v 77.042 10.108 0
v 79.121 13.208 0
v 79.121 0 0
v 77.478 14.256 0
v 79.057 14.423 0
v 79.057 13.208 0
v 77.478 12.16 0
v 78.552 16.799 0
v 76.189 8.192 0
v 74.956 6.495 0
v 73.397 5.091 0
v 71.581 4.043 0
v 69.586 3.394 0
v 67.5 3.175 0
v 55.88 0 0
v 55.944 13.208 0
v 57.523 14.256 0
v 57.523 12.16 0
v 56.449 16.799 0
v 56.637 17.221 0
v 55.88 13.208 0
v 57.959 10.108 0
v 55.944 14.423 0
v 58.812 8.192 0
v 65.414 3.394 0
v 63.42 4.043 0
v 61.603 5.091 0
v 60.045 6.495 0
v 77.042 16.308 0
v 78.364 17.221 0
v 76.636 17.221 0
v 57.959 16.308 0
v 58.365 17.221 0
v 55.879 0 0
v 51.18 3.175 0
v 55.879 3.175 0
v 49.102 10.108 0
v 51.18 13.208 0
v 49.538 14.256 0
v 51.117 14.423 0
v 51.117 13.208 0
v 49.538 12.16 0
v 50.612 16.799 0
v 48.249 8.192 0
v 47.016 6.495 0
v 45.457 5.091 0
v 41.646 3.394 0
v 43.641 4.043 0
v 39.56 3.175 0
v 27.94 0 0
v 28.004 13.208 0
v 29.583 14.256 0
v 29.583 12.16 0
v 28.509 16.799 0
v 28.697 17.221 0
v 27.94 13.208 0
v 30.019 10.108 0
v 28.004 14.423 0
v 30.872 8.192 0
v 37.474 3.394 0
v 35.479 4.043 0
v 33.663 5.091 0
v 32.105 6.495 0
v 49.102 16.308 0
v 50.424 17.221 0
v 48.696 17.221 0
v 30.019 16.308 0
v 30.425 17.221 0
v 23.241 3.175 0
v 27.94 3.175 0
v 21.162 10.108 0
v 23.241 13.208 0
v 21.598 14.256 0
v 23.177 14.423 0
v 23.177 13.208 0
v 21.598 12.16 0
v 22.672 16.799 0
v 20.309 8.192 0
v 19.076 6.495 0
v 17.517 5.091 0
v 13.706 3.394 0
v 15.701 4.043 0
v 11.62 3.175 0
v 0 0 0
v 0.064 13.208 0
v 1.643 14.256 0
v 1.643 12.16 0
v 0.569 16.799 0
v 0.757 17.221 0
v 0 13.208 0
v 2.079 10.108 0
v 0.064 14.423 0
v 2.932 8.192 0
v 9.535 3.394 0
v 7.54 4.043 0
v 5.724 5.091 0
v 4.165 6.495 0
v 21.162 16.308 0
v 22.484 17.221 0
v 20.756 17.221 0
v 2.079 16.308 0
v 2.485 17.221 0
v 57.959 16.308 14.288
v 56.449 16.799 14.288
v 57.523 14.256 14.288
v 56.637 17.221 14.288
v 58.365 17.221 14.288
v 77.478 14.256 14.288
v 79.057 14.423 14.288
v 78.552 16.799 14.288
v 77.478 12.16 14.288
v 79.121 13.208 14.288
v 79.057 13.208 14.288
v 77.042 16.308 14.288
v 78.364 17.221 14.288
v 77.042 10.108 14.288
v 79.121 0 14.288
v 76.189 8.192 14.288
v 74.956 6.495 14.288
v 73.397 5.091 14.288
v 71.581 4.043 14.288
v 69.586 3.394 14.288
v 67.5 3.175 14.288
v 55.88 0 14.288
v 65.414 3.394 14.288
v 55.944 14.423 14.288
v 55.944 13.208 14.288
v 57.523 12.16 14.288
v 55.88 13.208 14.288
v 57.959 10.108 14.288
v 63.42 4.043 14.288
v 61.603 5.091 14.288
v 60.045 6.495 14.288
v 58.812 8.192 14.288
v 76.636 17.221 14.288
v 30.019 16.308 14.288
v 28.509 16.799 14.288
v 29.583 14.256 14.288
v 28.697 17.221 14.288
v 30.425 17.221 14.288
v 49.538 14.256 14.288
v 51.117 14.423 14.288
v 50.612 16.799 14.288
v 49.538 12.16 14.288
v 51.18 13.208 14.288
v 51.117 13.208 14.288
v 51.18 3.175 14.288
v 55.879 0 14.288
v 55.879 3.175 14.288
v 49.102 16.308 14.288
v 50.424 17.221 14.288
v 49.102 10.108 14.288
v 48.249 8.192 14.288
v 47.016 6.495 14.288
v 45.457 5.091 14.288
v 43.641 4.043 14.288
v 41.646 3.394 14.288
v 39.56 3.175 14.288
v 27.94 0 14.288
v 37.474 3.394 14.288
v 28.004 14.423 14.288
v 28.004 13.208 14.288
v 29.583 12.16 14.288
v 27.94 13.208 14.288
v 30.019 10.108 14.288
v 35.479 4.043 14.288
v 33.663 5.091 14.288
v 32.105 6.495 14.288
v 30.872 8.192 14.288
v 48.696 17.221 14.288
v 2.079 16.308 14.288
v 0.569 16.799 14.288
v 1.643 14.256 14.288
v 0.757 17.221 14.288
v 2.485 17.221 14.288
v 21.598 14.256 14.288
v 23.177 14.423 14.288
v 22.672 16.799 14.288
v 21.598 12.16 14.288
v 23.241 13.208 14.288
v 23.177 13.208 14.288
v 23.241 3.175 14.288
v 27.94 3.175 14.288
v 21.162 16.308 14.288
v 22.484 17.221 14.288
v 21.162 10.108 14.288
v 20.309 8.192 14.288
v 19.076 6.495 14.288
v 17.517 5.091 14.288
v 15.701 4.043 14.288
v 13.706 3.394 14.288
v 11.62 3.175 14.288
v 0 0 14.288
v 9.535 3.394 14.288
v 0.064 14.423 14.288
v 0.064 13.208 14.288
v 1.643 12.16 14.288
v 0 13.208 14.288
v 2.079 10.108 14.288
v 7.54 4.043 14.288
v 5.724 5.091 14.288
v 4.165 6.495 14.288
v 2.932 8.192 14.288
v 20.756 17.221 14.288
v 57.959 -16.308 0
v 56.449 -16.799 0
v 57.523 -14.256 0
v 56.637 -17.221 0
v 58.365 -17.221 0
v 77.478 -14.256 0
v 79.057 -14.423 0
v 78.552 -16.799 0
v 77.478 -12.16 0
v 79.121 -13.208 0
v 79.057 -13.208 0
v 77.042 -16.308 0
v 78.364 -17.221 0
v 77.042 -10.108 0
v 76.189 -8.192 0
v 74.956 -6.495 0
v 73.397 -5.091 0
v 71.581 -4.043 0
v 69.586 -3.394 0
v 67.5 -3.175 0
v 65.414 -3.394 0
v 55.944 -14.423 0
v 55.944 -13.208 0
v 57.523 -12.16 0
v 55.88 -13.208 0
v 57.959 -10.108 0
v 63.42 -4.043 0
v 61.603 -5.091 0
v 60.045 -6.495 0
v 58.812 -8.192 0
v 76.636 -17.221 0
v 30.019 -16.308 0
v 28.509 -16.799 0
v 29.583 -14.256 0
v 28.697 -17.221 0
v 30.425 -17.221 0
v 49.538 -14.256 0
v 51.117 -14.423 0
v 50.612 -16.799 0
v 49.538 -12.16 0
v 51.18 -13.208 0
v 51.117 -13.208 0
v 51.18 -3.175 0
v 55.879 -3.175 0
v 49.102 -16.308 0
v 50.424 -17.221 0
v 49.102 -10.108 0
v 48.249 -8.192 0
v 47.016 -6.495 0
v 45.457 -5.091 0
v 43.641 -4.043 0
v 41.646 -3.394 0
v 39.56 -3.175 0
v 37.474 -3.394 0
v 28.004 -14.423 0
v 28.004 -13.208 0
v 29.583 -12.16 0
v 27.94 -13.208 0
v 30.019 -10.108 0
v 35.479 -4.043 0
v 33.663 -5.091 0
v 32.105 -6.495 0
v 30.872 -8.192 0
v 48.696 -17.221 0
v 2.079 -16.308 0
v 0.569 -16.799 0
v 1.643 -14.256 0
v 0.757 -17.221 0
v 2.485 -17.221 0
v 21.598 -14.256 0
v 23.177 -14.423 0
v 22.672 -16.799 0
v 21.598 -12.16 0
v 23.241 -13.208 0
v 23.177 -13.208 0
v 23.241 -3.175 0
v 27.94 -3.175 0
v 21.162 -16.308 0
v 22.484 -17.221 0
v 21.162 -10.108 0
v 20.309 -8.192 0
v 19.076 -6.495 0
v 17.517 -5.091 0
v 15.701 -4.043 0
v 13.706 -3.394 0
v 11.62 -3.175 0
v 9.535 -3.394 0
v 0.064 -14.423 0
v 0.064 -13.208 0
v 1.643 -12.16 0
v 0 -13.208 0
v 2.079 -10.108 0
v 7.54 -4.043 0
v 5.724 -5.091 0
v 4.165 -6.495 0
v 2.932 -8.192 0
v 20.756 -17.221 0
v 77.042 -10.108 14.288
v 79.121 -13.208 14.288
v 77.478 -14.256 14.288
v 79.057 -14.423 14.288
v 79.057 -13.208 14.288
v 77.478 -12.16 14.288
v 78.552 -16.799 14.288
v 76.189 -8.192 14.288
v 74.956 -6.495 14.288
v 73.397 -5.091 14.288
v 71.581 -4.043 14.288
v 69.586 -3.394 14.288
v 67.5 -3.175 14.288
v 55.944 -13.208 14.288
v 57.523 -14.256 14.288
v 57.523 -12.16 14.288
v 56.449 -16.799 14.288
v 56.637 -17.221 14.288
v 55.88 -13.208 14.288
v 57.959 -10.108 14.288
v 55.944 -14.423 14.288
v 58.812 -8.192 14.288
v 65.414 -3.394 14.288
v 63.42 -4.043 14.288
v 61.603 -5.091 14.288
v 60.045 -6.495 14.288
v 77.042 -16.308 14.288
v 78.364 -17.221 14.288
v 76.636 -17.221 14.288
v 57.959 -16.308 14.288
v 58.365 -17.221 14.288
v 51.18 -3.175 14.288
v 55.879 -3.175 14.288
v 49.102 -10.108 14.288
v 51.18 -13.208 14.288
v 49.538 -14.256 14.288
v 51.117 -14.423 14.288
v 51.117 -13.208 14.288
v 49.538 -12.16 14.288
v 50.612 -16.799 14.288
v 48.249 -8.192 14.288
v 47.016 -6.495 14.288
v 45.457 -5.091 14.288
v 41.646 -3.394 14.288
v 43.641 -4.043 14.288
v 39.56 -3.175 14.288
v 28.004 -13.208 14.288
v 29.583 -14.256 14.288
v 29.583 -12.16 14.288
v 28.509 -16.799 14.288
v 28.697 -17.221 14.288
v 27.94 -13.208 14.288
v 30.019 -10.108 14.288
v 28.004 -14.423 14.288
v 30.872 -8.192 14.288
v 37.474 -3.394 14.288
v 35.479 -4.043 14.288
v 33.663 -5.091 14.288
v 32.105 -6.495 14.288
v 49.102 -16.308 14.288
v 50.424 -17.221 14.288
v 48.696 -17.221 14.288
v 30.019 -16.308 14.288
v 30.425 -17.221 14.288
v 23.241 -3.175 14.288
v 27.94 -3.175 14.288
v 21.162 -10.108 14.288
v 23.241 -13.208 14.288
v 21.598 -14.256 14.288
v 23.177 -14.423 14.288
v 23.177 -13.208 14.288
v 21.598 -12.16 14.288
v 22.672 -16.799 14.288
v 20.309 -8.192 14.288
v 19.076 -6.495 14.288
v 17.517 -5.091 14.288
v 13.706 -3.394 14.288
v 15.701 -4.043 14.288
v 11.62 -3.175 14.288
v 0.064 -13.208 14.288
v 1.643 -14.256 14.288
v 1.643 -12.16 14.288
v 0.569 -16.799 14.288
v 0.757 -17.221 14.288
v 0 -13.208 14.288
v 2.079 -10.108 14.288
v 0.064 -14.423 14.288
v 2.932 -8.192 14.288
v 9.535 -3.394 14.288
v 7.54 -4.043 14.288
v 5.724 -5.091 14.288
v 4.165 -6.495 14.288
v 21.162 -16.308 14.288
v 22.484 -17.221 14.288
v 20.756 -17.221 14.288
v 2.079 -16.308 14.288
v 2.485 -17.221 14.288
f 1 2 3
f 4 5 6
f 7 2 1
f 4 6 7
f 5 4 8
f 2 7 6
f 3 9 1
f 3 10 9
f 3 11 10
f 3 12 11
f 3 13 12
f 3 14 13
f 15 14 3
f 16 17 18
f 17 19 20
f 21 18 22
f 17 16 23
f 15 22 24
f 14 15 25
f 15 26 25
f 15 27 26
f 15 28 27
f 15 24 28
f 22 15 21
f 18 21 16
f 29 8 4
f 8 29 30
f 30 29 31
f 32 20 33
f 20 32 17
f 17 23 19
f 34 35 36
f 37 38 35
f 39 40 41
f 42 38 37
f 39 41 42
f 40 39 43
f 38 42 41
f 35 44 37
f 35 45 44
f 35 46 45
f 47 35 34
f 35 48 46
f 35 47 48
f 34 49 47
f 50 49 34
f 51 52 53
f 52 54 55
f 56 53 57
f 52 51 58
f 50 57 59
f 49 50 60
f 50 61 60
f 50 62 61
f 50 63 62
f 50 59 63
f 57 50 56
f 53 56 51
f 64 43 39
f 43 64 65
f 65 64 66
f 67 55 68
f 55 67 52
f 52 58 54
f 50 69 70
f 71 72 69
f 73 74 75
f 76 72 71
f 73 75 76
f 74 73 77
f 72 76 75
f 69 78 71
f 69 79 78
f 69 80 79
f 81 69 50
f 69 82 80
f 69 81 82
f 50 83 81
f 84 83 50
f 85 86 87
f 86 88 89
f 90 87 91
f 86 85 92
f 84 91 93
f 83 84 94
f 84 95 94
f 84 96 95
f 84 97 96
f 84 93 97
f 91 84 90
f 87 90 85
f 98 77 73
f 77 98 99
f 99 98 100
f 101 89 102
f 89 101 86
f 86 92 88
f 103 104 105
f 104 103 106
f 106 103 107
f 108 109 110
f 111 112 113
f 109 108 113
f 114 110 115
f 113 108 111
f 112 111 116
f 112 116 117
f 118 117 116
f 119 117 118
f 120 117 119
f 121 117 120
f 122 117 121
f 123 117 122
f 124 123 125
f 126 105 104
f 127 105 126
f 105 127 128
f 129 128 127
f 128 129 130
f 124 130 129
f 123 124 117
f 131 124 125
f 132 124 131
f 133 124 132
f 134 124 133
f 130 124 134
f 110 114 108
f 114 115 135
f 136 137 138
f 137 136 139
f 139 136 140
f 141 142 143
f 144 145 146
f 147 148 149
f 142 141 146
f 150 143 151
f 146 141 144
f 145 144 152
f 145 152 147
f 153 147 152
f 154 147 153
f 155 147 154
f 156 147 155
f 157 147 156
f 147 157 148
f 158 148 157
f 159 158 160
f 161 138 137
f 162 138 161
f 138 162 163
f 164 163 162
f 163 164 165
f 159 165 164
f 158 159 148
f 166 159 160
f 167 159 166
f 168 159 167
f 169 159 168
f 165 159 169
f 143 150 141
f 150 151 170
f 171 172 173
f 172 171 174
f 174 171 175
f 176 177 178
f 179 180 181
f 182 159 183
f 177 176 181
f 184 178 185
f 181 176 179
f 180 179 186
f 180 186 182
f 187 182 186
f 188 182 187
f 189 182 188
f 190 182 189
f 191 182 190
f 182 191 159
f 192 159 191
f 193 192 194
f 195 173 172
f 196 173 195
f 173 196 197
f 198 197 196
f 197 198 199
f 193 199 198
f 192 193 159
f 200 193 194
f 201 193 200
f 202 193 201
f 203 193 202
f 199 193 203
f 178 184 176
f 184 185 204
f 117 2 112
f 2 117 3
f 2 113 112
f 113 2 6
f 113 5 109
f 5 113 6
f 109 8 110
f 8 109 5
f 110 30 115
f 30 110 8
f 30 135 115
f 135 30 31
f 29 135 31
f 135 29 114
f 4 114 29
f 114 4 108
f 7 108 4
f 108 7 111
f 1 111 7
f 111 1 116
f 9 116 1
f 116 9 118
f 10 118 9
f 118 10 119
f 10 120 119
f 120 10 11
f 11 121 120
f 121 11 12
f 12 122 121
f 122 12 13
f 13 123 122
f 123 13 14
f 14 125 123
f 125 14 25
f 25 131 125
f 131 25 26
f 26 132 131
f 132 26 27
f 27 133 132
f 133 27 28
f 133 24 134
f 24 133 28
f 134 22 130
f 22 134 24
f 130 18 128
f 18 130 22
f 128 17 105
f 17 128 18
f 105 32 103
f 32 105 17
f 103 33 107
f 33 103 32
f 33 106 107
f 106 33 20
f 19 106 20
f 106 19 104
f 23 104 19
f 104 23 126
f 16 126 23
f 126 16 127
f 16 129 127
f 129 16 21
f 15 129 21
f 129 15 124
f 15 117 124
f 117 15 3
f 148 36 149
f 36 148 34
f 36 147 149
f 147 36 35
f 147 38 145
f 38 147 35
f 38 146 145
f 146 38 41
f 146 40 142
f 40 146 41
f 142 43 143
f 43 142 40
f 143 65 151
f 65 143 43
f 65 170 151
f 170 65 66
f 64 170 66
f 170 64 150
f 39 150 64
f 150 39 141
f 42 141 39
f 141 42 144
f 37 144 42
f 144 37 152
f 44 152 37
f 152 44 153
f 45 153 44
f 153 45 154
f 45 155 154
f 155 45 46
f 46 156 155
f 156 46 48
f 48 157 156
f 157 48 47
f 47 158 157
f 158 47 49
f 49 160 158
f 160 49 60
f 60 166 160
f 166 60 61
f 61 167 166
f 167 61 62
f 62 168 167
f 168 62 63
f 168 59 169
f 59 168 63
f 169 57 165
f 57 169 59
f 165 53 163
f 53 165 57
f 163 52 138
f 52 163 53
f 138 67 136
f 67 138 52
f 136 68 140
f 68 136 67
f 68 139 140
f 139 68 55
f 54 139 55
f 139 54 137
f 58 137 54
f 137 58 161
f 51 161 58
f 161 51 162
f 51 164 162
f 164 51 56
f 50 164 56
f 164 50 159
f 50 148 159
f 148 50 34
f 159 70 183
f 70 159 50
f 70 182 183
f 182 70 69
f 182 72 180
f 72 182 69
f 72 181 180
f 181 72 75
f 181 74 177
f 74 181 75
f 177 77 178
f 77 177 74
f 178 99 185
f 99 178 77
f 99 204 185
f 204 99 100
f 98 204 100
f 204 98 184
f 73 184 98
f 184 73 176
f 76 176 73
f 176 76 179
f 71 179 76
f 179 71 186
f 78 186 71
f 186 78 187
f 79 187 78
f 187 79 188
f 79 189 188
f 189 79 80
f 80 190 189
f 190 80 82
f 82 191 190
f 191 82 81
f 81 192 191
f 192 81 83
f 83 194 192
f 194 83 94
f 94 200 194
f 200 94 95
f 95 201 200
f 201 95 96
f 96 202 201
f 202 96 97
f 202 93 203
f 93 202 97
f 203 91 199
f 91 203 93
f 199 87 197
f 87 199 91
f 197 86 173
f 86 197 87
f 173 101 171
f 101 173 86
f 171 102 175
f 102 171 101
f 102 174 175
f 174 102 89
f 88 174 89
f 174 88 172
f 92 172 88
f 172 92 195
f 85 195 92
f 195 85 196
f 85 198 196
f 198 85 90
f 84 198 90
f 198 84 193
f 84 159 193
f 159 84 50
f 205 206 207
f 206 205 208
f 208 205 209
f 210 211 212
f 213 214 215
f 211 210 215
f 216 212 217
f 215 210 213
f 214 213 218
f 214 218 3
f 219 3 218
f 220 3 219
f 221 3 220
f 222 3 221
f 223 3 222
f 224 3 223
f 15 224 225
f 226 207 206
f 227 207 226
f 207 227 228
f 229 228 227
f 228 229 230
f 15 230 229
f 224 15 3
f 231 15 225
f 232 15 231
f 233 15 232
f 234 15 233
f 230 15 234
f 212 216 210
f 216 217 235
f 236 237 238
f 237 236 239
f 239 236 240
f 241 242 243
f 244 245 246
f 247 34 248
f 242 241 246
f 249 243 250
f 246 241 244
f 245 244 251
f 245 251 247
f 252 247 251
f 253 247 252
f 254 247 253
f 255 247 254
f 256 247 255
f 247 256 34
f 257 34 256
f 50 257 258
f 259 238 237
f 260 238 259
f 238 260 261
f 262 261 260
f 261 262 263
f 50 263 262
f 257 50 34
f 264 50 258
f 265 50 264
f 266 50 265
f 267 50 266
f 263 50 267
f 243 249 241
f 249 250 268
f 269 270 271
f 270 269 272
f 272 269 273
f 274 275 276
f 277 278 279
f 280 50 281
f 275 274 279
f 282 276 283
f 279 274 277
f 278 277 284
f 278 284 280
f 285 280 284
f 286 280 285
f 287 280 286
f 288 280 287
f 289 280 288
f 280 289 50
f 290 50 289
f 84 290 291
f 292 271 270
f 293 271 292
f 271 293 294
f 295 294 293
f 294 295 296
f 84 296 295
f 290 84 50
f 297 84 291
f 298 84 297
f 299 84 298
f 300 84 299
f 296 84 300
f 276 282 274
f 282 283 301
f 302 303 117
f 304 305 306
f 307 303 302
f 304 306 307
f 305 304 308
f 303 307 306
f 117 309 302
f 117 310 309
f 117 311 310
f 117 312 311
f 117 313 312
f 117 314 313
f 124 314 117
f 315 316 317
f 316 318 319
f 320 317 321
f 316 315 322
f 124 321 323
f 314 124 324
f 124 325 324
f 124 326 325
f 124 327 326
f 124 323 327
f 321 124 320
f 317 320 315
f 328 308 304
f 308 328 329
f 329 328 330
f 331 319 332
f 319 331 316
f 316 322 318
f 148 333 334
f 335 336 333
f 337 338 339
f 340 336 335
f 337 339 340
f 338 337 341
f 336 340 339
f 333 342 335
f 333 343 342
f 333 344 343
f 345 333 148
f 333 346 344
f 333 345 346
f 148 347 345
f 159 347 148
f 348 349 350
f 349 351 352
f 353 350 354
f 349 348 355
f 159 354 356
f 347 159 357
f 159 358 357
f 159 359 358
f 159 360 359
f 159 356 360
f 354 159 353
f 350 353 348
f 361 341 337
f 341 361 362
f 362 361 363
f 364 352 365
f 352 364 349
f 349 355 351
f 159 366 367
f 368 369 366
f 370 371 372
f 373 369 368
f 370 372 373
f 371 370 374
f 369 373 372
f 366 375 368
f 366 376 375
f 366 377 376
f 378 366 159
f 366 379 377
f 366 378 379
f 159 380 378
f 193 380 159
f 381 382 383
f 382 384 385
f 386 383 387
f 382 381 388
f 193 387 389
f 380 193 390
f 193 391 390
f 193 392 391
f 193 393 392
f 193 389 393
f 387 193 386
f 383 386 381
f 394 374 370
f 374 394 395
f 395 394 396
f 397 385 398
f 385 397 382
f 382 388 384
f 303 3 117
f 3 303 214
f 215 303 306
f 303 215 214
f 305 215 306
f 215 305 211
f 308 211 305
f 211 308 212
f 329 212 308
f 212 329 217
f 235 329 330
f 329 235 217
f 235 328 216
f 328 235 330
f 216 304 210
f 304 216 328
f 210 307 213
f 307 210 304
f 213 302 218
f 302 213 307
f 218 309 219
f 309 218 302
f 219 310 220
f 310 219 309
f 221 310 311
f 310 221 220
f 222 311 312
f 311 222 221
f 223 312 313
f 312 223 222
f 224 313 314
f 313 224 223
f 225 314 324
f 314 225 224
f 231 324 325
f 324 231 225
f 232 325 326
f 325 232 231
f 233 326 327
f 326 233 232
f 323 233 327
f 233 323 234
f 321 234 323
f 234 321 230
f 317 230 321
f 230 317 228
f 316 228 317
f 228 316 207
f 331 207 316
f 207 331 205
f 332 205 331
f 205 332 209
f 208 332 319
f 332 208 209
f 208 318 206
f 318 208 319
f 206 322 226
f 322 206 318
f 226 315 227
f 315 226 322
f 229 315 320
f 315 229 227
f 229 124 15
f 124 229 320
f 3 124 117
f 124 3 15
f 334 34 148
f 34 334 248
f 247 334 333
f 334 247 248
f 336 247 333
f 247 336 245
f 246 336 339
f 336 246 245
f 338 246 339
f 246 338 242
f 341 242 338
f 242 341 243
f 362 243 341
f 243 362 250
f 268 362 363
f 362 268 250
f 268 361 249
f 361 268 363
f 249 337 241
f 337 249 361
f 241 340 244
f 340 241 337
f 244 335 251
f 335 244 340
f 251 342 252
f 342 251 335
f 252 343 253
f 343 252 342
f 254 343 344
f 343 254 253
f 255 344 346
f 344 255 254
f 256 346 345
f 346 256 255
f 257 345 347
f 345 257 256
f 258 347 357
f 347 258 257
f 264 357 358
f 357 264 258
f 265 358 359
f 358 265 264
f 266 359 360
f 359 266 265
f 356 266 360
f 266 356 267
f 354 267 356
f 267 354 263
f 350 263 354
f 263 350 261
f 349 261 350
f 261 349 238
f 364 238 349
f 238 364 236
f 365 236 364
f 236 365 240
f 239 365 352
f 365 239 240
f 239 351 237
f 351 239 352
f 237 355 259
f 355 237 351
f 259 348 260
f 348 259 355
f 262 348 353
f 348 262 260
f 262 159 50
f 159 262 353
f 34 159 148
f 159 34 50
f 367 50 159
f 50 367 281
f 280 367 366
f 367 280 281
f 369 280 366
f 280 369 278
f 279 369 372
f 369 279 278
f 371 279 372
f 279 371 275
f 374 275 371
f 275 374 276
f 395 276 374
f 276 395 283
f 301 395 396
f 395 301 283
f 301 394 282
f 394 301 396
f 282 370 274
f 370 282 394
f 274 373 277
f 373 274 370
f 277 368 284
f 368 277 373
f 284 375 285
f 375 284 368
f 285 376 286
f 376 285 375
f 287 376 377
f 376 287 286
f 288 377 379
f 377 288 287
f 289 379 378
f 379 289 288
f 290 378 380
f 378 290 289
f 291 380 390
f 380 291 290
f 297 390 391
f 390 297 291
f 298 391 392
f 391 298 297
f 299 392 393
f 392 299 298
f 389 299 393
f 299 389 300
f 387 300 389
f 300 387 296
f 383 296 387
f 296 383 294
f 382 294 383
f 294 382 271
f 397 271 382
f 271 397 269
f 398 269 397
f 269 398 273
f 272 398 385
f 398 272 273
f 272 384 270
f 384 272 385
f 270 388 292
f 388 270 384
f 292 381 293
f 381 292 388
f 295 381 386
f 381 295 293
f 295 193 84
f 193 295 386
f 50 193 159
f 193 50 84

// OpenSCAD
module ShellHolder(count=4, shellOd=0.79, wall=1/16, height=1/2, base=3/16, width=1.1) {
  linear_extrude(height=height)
  translate([(shellOd/2) + wall,(shellOd/2) + max(base, wall)])
  rotate([0,0,-90])
  difference() {
    for (i = [0:count-1])
    translate([0,width*i,0])
    difference() {
      union() {

        // Shell Holder Body
        circle(r=(shellOd/2) + wall, $fn=30);

        // Base
        translate([(shellOd/2), -(shellOd/2) -wall])
        square([max(base, wall), width]);

        // Infill
        translate([0,-(shellOd/2) - wall])
        square([shellOd/2, shellOd + (wall*2)]);
      }

      // Cut out the shell hole
      circle(r=shellOd/2, $fn=30);

      // Cut off the edge of the shell hole
      translate([-shellOd*.7,0])
      square([shellOd, shellOd*2], center=true);
    }

    // Cut off the tab of the last holder
    translate([0,(width*(count-1)) + (shellOd/2) + wall,0])
    square([base+1, width+1]);
  }
}

scale([25.4, 25.4, 25.4])
union() {
  ShellHolder(count=3, base=1/8, height=9/16);
  
  mirror([0,1,0])
  ShellHolder(count=3, base=1/8, height=9/16);
}
